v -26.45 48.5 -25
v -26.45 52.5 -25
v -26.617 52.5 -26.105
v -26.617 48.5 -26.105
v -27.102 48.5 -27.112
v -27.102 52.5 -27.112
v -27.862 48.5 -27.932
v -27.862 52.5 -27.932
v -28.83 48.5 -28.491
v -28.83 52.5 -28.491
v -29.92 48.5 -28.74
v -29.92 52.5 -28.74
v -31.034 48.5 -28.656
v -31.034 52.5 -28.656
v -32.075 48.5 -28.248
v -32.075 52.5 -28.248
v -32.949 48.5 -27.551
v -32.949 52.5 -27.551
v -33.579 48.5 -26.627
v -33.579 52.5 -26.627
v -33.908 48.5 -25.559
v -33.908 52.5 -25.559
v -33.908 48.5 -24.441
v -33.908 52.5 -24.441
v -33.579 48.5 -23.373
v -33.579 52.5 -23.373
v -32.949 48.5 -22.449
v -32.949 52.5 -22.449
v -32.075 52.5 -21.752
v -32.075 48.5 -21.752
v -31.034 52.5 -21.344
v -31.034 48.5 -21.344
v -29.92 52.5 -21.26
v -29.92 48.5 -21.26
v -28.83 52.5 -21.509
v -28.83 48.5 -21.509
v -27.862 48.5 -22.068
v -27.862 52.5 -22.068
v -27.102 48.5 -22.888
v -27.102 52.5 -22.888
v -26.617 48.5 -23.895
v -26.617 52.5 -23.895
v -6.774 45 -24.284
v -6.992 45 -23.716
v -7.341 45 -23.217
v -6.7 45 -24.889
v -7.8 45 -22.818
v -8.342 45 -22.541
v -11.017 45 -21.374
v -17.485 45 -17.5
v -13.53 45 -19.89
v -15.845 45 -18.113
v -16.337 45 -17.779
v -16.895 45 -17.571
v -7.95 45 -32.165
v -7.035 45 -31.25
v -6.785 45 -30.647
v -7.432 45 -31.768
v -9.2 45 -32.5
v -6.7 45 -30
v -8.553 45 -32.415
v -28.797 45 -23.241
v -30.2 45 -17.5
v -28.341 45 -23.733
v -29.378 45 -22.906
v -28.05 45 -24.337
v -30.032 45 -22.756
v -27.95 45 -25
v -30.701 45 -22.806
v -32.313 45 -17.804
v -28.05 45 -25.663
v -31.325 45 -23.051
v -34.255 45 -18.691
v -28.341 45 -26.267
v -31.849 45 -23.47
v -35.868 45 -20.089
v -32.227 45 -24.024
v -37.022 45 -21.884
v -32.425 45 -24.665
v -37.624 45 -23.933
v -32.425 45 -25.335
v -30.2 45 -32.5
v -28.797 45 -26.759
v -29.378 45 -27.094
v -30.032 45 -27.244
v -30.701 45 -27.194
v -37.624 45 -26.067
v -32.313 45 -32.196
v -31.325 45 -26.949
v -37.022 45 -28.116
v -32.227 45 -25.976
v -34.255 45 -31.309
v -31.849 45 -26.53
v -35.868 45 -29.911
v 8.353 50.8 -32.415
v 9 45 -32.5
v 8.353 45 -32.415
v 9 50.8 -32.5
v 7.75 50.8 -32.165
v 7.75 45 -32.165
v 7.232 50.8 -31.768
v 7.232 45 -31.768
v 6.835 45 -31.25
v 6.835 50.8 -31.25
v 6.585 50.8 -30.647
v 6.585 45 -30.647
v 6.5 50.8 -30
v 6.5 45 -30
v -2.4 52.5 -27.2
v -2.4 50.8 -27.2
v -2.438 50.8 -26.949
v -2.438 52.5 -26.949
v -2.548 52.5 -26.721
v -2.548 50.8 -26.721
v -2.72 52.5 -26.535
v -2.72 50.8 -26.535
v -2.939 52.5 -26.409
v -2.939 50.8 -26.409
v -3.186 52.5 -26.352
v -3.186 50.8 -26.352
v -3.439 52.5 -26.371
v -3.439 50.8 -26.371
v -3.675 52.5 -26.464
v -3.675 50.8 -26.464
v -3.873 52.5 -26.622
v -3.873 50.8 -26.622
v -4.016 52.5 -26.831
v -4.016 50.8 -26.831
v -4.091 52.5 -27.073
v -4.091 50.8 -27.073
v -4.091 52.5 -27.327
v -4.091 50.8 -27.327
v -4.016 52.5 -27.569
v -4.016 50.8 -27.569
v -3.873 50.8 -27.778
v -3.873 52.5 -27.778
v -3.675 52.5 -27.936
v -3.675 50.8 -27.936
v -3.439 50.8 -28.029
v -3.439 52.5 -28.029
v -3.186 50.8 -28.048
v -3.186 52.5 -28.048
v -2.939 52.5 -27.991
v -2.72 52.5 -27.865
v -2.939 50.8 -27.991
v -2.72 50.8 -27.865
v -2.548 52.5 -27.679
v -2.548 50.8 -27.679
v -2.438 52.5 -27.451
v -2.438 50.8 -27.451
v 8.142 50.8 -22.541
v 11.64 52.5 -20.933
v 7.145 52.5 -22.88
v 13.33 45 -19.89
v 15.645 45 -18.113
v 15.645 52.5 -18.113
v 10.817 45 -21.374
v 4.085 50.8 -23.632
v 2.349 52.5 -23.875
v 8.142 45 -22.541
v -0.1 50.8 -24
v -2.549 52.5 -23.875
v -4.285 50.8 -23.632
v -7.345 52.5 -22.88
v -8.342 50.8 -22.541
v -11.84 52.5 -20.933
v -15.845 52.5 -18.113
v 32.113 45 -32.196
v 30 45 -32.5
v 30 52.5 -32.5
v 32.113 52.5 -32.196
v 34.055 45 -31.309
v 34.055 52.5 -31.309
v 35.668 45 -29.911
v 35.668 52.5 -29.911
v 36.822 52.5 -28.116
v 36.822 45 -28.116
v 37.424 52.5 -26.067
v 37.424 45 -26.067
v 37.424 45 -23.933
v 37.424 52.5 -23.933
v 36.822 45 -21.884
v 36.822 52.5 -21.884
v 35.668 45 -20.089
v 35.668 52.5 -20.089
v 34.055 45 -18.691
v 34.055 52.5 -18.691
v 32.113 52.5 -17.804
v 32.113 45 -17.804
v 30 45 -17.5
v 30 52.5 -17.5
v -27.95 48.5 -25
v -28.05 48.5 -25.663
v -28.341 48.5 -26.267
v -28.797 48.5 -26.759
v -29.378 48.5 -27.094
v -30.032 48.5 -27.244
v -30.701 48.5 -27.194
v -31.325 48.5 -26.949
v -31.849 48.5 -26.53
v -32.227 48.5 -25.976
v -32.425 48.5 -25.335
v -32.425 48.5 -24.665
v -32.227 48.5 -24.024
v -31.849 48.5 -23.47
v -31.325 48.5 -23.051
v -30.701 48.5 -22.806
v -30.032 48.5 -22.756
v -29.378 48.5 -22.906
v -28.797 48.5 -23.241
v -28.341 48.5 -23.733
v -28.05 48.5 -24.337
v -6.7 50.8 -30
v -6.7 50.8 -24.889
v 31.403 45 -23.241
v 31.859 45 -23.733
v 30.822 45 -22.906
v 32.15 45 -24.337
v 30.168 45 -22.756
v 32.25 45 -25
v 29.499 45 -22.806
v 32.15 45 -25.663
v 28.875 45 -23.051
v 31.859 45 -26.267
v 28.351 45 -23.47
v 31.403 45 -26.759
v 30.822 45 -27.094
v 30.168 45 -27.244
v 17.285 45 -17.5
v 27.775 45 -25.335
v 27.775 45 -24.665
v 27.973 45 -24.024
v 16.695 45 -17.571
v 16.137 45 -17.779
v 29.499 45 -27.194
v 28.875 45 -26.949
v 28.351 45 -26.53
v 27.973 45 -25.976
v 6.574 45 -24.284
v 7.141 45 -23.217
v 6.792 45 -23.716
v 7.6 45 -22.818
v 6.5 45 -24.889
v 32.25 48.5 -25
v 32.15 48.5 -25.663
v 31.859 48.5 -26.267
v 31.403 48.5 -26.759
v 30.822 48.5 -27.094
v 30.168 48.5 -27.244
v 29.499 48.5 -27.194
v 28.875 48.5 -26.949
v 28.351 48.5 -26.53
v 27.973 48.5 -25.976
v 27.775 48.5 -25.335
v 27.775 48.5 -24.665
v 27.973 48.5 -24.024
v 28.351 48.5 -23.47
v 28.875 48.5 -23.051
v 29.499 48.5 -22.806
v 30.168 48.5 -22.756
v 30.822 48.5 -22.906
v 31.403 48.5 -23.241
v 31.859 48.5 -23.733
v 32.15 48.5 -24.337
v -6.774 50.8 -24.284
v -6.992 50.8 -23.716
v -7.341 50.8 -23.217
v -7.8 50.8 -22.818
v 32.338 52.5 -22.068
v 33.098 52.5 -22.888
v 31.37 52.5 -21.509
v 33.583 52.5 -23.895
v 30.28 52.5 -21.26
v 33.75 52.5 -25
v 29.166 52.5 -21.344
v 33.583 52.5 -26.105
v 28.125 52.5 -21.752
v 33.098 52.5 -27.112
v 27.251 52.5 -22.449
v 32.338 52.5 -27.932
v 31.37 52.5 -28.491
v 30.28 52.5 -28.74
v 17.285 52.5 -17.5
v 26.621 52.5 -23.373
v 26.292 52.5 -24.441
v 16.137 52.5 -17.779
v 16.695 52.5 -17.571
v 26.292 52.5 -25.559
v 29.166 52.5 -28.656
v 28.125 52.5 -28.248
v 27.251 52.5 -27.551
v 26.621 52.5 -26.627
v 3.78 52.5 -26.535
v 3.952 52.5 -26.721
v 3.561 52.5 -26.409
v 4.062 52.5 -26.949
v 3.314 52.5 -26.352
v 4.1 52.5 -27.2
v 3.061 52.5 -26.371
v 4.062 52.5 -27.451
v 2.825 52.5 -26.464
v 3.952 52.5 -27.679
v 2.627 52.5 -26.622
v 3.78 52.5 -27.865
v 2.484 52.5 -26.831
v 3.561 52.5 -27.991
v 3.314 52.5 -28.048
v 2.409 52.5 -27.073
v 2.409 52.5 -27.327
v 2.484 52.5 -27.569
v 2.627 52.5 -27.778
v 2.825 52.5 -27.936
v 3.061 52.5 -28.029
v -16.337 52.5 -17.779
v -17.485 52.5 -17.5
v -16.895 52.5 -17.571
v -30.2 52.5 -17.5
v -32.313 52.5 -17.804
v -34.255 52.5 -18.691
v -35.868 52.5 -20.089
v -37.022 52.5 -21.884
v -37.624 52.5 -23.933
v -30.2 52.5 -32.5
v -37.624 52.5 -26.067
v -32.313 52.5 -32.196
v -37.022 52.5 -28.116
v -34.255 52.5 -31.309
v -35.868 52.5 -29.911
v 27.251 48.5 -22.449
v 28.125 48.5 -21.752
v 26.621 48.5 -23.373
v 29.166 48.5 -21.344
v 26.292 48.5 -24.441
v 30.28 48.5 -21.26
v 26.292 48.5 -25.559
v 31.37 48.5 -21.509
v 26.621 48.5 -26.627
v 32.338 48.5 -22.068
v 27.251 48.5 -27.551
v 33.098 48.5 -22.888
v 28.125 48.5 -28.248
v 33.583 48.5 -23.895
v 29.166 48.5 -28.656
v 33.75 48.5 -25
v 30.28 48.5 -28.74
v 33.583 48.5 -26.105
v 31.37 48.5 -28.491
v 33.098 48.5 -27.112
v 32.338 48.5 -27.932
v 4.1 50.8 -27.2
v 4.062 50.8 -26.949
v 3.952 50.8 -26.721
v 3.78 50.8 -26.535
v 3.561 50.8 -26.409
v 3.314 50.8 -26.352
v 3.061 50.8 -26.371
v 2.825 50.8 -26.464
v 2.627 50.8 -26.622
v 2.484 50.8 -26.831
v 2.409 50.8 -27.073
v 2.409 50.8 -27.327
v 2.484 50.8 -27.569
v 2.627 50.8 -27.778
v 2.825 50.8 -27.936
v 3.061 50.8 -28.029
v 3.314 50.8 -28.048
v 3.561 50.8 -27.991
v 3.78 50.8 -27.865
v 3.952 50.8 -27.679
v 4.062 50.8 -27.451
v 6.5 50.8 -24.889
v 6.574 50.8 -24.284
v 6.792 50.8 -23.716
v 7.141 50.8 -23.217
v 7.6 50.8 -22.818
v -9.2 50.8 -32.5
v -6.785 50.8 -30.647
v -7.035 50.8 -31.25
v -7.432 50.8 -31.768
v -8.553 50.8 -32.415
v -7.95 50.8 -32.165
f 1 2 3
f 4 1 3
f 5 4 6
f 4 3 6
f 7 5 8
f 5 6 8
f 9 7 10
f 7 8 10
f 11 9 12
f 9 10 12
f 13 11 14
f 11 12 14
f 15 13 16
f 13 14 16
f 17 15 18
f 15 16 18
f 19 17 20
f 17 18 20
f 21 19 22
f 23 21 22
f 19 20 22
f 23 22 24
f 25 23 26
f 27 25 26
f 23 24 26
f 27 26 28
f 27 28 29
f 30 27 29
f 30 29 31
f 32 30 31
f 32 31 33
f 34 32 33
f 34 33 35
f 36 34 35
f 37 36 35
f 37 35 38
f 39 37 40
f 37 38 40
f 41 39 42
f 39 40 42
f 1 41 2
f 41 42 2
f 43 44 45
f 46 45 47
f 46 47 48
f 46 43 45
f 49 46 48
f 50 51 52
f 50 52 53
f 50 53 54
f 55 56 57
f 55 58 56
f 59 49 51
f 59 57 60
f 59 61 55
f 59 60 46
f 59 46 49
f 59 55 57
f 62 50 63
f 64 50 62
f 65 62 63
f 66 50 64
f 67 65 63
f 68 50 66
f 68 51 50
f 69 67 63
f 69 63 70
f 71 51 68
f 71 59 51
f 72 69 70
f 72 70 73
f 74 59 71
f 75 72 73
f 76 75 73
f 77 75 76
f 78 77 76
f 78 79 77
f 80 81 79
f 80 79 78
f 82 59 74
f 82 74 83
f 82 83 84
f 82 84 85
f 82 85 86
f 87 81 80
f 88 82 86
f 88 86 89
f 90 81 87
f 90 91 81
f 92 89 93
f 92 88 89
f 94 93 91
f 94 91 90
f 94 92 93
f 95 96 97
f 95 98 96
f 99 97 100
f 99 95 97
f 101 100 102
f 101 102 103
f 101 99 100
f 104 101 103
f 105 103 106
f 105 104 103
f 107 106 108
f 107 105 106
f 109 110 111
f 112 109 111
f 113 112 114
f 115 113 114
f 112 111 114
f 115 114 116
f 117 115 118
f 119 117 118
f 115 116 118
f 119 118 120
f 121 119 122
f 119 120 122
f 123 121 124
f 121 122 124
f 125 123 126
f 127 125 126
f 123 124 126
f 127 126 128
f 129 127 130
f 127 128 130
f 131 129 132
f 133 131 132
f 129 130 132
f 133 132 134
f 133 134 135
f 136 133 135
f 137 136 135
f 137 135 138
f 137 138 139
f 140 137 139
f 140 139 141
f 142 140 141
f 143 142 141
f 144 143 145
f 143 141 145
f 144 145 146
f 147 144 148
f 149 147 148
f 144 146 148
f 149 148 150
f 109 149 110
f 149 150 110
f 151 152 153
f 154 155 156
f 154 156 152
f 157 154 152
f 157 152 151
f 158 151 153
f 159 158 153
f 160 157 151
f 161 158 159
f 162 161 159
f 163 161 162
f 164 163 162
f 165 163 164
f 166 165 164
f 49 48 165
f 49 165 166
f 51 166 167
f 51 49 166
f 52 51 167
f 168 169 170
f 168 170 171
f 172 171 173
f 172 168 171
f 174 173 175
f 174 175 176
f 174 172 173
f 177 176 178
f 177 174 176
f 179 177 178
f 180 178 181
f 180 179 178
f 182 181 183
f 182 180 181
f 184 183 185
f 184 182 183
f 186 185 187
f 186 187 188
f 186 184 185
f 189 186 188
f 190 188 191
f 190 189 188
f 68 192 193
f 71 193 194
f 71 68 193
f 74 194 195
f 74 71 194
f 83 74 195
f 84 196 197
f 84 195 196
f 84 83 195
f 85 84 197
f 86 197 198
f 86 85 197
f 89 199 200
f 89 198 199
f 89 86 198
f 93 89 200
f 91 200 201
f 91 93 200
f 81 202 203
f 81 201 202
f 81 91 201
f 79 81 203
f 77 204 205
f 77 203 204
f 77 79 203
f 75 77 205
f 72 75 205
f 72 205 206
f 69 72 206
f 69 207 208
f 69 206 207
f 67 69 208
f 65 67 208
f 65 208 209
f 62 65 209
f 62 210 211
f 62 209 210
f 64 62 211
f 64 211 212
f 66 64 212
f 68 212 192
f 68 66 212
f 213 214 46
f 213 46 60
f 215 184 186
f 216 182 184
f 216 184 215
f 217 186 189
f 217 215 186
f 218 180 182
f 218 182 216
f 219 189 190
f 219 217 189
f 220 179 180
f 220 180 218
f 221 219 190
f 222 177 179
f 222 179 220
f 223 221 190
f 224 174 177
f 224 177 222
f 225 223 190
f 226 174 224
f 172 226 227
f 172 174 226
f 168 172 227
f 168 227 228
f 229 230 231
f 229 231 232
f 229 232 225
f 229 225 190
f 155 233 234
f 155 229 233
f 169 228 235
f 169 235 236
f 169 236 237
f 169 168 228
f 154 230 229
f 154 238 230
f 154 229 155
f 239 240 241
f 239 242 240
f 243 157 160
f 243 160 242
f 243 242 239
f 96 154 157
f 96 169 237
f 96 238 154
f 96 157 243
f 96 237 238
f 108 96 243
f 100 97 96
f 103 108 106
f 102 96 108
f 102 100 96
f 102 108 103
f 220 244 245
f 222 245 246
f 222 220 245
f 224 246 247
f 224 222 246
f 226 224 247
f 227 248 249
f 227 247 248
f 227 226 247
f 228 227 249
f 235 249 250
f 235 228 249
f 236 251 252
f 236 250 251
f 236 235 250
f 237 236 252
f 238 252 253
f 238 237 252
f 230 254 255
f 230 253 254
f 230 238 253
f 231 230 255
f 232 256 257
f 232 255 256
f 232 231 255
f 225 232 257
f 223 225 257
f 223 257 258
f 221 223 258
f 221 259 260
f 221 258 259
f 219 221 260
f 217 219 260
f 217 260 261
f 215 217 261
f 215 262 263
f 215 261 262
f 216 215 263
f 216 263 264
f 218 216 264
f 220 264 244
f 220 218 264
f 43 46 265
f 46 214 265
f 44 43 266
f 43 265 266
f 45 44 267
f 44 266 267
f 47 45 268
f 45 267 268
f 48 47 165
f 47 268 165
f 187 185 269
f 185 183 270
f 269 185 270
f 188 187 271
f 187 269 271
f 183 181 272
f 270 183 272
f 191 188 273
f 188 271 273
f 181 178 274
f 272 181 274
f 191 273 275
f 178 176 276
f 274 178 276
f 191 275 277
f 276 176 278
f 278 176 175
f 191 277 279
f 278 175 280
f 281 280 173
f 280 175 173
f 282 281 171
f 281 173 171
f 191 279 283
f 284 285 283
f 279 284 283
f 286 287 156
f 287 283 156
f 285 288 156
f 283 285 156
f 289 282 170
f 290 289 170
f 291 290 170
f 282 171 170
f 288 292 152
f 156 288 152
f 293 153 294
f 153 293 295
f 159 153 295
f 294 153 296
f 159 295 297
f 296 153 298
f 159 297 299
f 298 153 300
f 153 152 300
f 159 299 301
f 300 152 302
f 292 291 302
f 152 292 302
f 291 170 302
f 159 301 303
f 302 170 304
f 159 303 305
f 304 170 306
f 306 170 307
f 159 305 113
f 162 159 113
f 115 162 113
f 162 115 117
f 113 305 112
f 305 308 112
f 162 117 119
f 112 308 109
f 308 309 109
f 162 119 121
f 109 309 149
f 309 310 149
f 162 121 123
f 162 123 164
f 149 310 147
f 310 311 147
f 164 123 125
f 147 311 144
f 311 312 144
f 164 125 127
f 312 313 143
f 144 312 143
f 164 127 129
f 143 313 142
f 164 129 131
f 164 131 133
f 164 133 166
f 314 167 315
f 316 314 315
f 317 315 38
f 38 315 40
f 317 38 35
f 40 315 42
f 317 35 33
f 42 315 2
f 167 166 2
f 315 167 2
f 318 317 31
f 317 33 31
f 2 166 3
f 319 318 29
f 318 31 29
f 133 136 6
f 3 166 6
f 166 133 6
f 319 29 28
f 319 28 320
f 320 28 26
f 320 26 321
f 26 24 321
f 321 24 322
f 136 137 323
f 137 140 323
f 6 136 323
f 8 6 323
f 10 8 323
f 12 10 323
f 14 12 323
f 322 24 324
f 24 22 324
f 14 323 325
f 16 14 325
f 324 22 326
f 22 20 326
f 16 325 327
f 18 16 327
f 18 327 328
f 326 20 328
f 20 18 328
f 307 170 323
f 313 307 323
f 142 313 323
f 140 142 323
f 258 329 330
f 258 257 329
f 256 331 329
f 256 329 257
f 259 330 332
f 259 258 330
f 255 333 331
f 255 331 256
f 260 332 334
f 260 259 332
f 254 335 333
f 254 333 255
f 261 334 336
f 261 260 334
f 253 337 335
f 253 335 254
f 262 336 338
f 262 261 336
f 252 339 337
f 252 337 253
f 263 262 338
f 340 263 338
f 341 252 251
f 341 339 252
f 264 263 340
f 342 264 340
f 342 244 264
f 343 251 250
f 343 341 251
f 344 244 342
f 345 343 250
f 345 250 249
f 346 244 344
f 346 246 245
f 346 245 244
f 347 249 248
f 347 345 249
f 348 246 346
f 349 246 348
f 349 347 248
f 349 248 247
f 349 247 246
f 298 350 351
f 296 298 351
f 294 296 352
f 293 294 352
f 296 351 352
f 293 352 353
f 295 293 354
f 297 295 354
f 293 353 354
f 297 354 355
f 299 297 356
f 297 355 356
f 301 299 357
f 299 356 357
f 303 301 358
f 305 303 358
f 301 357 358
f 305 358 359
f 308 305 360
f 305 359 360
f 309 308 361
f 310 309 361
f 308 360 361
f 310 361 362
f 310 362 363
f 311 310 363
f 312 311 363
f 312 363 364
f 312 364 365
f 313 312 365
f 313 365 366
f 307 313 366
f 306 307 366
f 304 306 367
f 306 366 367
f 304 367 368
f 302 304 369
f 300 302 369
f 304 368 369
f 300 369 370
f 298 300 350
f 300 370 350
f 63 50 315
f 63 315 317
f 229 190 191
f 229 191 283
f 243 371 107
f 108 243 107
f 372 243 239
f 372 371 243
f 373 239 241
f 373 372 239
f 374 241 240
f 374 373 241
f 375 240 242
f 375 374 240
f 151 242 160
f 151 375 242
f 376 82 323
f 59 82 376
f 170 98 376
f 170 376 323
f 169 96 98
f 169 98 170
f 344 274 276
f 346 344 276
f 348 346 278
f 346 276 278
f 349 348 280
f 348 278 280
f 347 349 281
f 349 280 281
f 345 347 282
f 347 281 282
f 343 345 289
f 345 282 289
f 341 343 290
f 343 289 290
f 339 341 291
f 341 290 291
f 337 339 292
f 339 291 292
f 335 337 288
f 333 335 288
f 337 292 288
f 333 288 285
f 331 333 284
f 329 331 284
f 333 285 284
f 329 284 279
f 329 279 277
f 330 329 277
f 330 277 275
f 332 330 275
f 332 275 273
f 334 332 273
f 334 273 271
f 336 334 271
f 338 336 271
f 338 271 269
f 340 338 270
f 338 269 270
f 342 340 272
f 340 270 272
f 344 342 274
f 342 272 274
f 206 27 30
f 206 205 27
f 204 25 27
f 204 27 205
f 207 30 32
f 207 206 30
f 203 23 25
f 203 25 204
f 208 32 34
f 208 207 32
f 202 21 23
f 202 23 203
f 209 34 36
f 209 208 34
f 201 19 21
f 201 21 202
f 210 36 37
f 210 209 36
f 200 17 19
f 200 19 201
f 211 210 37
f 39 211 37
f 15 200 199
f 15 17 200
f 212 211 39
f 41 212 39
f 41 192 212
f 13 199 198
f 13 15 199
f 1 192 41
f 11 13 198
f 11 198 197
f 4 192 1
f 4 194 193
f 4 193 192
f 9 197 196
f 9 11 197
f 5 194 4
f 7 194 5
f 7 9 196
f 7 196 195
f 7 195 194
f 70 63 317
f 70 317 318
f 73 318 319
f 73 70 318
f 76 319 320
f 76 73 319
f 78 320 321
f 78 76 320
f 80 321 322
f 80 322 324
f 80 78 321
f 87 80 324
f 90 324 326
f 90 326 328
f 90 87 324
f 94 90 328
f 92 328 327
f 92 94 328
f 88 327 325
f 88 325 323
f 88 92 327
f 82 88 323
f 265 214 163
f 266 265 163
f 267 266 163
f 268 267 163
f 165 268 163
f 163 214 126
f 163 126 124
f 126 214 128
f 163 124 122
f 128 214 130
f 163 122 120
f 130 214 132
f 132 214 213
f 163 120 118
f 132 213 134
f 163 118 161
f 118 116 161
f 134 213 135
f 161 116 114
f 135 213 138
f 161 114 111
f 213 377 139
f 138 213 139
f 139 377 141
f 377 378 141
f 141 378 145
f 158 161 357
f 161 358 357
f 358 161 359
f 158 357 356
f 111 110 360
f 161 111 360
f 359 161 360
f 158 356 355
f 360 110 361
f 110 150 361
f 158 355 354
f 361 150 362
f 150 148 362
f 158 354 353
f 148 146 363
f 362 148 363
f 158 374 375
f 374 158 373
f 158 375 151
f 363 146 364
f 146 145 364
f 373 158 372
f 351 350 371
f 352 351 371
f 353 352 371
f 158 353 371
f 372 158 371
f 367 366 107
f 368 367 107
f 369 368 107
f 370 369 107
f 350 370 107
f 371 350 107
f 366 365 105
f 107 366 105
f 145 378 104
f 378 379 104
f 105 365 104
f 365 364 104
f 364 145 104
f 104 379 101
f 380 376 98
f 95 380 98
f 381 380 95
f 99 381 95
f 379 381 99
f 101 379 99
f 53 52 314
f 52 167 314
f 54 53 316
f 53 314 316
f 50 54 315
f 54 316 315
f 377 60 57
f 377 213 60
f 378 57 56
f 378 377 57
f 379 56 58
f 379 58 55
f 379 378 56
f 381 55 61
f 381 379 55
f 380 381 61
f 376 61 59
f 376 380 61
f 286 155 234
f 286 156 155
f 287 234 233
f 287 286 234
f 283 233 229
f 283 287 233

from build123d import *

# Parameters (mm, degrees)
SKETCH1_R           = 2.25
BOSS_EXTRUDE1_DEPTH = 7.5
SKETCH2_R           = 0.85
CUT_EXTRUDE1_DEPTH  = 8.5
SKETCH3_R           = 0.85
BOSS_EXTRUDE2_DEPTH = 1.7
SKETCH4_W           = 13.2
SKETCH4_H           = 9.425338572
CUT_EXTRUDE2_DEPTH  = 5.8
FILLET1_R           = 2.5
SKETCH5_R           = 3.75
CUT_EXTRUDE3_DEPTH  = 4


with BuildPart() as part:
    # Sketch1 → Boss-Extrude1 (new body)
    with BuildSketch(Plane(origin=(0, 45, 0), x_dir=(1, 0, 0), z_dir=(0, 1, 0))):
        with BuildLine():
            Line((-16.524067706, 17.5), (-30.2, 17.5))
            ThreePointArc((-30.2, 17.5), (-37.7, 25), (-30.2, 32.5))
            Line((-30.2, 32.5), (30, 32.5))
            ThreePointArc((30, 32.5), (37.5, 25), (30, 17.5))
            Line((30, 17.5), (16.324067706, 17.5))
            ThreePointArc((16.324067706, 17.5), (-0.1, 24), (-16.524067706, 17.5))
        make_face()
        with Locations((-30.2, 25)):
            Circle(SKETCH1_R, mode=Mode.SUBTRACT)
        with Locations((30, 25)):
            Circle(SKETCH1_R, mode=Mode.SUBTRACT)
    extrude(amount=BOSS_EXTRUDE1_DEPTH)

    # Sketch2 → Cut-Extrude1 (cut, through all)
    with BuildSketch(Plane.XZ.offset(-45)):
        with Locations((-3.25, -27.2)):
            Circle(SKETCH2_R)
        with Locations((3.25, -27.2)):
            Circle(SKETCH2_R)
    extrude(amount=-CUT_EXTRUDE1_DEPTH, mode=Mode.SUBTRACT)

    # Sketch3 → Boss-Extrude2 (add)
    with BuildSketch(Plane.XZ.offset(-52.5)):
        with BuildLine():
            Line((-3.25, -24.7), (3.25, -24.7))
            ThreePointArc((3.25, -24.7), (5.75, -27.2), (3.25, -29.7))
            Line((3.25, -29.7), (-3.25, -29.7))
            ThreePointArc((-3.25, -29.7), (-5.75, -27.2), (-3.25, -24.7))
        make_face()
        with Locations((3.25, -27.2)):
            Circle(SKETCH3_R, mode=Mode.SUBTRACT)
        with Locations((-3.25, -27.2)):
            Circle(SKETCH3_R, mode=Mode.SUBTRACT)
    extrude(amount=BOSS_EXTRUDE2_DEPTH)

    # Sketch4 → Cut-Extrude2 (cut)
    with BuildSketch(Plane(origin=(0, 45, 0), x_dir=(1, 0, 0), z_dir=(0, 1, 0))):
        with Locations((-0.1, 27.787330714)):
            Rectangle(SKETCH4_W, SKETCH4_H)
    extrude(amount=CUT_EXTRUDE2_DEPTH, mode=Mode.SUBTRACT)

    # Fillet1
    fillet1_edges = [part.edges().sort_by_distance(p)[0] for p in [
        (-16.524067706, 48.75, -17.5),
        (16.324067706, 48.75, -17.5),
        (-6.7, 47.9, -32.5),
        (-6.7, 47.9, -23.074661428),
        (6.5, 47.9, -23.074661428),
        (6.5, 47.9, -32.5),
    ]]
    fillet(fillet1_edges, radius=FILLET1_R)

    # Sketch5 → Cut-Extrude3 (cut)
    with BuildSketch(Plane(origin=(0, 52.5, 0), x_dir=(1, 0, 0), z_dir=(0, 1, 0))):
        with Locations((-30.2, 25)):
            Circle(SKETCH5_R)
        with Locations((30, 25)):
            Circle(SKETCH5_R)
    extrude(amount=-CUT_EXTRUDE3_DEPTH, mode=Mode.SUBTRACT)


solid = part.part
